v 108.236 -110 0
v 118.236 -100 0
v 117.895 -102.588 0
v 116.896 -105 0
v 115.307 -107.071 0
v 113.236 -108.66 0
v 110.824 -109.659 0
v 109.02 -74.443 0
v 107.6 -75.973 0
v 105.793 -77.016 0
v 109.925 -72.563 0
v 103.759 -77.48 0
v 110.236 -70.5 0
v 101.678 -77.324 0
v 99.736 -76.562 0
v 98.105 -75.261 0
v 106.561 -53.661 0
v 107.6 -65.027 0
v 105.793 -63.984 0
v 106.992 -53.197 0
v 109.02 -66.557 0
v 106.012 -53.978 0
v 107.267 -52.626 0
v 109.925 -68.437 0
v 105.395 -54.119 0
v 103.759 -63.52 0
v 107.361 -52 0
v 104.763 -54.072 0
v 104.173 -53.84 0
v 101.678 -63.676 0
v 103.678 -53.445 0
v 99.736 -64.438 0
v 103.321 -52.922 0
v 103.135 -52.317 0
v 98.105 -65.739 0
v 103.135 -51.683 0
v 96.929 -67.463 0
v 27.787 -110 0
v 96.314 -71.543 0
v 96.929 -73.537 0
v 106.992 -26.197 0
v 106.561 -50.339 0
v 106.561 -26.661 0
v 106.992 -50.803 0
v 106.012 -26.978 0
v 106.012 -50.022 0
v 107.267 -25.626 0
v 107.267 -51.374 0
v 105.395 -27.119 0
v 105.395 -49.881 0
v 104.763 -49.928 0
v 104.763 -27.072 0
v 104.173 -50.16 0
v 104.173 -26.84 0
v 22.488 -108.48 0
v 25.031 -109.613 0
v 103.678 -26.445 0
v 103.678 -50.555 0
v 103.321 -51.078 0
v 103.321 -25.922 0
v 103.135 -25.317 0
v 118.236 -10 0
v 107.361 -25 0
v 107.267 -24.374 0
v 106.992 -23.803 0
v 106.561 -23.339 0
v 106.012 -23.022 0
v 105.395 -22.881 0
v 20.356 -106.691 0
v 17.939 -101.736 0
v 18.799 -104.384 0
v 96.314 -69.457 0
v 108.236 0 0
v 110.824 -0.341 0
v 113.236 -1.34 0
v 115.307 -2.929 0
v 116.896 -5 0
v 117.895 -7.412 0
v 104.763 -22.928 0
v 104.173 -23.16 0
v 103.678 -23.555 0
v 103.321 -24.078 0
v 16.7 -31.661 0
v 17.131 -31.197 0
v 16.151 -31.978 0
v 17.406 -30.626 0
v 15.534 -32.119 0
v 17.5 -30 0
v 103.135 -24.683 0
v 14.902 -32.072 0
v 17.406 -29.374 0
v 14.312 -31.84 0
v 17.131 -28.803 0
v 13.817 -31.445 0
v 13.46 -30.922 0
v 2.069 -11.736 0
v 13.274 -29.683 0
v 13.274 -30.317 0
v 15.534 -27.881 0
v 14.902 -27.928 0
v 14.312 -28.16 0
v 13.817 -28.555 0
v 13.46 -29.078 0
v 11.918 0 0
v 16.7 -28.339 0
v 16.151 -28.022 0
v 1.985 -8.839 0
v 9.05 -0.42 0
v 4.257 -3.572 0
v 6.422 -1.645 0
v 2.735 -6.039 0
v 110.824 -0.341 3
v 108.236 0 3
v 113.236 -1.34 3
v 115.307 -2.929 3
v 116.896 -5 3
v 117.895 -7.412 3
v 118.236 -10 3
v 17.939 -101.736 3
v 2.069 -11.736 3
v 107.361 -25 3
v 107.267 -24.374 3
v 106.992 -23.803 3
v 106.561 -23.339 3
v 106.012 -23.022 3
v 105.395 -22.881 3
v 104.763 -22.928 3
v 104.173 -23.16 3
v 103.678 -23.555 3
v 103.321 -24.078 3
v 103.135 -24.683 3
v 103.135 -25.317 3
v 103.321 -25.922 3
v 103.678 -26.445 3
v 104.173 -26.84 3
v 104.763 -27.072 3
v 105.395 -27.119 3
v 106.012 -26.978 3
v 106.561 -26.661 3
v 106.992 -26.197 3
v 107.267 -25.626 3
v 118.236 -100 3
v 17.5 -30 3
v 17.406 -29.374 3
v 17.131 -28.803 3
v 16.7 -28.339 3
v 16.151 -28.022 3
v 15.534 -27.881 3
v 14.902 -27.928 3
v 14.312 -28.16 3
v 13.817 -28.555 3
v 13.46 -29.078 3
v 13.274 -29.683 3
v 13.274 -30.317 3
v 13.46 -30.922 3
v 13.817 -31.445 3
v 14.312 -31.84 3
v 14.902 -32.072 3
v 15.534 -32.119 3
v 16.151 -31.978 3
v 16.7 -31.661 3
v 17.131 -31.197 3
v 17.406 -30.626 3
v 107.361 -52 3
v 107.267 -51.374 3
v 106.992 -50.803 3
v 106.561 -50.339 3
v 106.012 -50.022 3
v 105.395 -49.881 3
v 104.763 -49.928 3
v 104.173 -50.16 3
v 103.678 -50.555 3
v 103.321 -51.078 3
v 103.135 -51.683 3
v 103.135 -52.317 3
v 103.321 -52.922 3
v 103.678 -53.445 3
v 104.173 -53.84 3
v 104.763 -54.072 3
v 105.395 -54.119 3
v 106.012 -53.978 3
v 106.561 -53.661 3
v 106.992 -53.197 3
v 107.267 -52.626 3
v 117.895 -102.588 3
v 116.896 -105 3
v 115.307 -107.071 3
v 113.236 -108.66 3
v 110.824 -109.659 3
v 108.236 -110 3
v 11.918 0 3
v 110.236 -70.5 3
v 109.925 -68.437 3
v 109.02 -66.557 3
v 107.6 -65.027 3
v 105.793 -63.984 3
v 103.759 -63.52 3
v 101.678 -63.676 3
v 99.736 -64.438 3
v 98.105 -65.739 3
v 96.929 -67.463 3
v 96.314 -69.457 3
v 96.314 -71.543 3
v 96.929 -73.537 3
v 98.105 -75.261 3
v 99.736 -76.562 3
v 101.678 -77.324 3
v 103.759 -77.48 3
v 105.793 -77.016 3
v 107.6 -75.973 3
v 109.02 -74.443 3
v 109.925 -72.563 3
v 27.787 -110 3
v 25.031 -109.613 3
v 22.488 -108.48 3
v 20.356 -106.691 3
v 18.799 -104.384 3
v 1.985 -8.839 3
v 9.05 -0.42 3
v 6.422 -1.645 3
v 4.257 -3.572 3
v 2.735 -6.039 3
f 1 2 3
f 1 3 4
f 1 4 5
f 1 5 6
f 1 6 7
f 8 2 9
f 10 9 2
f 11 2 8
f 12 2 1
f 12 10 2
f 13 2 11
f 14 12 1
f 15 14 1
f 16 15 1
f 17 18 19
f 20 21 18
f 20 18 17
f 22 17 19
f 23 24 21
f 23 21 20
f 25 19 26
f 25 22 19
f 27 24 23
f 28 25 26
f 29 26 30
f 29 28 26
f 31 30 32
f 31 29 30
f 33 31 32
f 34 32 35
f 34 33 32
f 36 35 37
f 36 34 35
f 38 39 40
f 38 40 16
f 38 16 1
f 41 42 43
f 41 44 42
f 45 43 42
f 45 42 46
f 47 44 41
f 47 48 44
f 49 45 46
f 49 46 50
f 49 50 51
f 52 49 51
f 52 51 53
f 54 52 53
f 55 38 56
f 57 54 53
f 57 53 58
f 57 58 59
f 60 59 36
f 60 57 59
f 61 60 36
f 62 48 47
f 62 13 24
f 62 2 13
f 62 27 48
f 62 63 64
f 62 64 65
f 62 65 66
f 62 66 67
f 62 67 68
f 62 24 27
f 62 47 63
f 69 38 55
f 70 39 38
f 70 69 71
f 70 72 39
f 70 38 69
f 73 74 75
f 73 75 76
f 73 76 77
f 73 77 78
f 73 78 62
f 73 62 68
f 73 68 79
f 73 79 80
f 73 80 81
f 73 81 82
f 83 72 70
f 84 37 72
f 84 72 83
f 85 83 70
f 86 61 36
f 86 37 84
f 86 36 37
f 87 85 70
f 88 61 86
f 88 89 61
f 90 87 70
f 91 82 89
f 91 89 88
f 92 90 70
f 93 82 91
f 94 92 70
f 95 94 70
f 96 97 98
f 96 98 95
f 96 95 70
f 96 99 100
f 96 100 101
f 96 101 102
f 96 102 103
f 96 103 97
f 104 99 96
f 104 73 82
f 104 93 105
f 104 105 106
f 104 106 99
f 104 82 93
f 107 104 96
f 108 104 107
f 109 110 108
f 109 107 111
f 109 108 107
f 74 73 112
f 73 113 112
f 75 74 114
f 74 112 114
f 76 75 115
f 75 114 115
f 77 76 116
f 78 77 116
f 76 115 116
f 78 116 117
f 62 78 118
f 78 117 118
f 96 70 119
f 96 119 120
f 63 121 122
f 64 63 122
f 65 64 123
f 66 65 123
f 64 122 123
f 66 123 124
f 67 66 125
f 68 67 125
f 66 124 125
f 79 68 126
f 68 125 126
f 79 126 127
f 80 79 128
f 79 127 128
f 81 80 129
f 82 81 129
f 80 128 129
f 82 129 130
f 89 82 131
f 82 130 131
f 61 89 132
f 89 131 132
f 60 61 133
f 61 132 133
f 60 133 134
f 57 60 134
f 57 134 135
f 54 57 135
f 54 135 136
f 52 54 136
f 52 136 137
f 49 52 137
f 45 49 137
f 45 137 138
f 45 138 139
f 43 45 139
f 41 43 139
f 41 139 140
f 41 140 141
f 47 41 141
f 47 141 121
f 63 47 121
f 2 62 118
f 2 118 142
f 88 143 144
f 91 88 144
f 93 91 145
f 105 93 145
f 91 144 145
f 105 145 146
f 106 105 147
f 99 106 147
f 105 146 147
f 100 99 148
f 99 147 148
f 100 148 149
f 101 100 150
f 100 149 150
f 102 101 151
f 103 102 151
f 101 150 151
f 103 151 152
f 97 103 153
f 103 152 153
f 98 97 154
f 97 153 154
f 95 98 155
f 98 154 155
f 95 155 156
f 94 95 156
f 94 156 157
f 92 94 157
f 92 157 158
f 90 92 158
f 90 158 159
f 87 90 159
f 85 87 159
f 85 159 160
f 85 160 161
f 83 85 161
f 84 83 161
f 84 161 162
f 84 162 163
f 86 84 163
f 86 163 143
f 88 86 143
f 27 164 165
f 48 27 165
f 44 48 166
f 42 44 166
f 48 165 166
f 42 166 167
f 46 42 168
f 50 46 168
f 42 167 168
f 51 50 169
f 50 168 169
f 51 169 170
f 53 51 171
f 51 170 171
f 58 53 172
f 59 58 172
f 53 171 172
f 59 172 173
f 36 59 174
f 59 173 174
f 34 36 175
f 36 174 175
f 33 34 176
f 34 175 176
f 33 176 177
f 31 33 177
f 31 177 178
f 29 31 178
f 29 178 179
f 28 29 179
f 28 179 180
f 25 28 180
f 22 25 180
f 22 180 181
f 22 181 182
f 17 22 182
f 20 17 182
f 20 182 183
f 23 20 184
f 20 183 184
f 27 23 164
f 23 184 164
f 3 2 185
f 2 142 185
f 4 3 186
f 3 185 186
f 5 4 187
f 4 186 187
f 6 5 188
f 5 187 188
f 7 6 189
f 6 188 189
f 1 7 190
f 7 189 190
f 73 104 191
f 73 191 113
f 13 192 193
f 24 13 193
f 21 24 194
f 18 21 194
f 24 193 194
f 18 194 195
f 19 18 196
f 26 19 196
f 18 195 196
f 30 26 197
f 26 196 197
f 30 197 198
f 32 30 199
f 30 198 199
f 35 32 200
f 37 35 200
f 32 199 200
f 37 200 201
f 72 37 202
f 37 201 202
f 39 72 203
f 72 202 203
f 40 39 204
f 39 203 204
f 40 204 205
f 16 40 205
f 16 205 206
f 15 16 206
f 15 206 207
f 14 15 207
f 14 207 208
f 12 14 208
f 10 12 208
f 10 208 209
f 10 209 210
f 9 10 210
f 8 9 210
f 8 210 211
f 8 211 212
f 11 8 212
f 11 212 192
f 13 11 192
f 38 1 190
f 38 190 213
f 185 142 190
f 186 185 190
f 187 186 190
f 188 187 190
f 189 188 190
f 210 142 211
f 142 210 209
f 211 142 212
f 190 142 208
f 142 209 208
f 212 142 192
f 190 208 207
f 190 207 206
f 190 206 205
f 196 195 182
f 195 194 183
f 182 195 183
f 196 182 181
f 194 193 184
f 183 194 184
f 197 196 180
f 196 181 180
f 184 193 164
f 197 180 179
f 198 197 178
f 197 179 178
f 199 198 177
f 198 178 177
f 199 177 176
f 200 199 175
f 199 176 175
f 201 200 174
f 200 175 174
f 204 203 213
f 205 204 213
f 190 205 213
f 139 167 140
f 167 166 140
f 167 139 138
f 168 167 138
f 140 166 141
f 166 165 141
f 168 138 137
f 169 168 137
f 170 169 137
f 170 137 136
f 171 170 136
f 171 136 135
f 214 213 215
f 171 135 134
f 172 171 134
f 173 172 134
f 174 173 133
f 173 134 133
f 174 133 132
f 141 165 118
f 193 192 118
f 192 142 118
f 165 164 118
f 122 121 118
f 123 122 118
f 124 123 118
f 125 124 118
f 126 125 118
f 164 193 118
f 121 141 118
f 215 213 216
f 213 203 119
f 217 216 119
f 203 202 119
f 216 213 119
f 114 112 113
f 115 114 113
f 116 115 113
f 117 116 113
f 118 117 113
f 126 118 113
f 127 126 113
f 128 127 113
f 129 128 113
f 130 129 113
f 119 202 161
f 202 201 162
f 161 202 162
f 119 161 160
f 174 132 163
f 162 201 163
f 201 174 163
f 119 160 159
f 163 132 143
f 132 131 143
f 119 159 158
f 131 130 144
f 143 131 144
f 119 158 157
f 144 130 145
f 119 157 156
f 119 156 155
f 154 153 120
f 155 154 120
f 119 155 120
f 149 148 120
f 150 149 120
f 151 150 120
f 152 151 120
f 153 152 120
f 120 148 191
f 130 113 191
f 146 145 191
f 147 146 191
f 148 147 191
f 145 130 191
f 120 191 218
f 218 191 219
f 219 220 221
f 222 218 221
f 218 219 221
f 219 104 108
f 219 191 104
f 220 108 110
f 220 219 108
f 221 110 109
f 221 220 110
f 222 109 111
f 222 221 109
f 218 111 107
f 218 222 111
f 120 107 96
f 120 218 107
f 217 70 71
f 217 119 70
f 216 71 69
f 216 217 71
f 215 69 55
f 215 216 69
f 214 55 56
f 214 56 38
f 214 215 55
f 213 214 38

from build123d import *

# Parameters (mm, degrees)
BOSS_EXTRUDE3_DEPTH = 3
SKETCH5_R           = 2.125
SKETCH5_R_2         = 7
CUT_EXTRUDE1_DEPTH  = 10
FILLET1_R           = 10
SKETCH6_R           = 2.125
CUT_EXTRUDE2_DEPTH  = 3


with BuildPart() as part:
    # Sketch4 → Boss-Extrude3 (new body)
    with BuildSketch(Plane.XY):
        Polygon((0, 0), (118.235967878, 0), (118.235967878, -110), (19.395967878, -110), align=None)
    extrude(amount=BOSS_EXTRUDE3_DEPTH)

    # Sketch5 → Cut-Extrude1 (cut)
    with BuildSketch(Plane.XY.offset(3)):
        with Locations((105.235967878, -25)):
            Circle(SKETCH5_R)
        with Locations((15.3749641, -30)):
            Circle(SKETCH5_R)
        with Locations((103.235967878, -70.5)):
            Circle(SKETCH5_R_2)
    extrude(amount=-CUT_EXTRUDE1_DEPTH, mode=Mode.SUBTRACT)

    # Fillet1
    fillet1_edges = [part.edges().sort_by_distance(p)[0] for p in [
        (0, 0, 1.5),
        (118.235967878, 0, 1.5),
        (118.235967878, -110, 1.5),
        (19.395967878, -110, 1.5),
    ]]
    fillet(fillet1_edges, radius=FILLET1_R)

    # Sketch6 → Cut-Extrude2 (cut)
    with BuildSketch(Plane.XY.offset(3)):
        with Locations((105.235967878, -52)):
            Circle(SKETCH6_R)
    extrude(amount=-CUT_EXTRUDE2_DEPTH, mode=Mode.SUBTRACT)


solid = part.part
